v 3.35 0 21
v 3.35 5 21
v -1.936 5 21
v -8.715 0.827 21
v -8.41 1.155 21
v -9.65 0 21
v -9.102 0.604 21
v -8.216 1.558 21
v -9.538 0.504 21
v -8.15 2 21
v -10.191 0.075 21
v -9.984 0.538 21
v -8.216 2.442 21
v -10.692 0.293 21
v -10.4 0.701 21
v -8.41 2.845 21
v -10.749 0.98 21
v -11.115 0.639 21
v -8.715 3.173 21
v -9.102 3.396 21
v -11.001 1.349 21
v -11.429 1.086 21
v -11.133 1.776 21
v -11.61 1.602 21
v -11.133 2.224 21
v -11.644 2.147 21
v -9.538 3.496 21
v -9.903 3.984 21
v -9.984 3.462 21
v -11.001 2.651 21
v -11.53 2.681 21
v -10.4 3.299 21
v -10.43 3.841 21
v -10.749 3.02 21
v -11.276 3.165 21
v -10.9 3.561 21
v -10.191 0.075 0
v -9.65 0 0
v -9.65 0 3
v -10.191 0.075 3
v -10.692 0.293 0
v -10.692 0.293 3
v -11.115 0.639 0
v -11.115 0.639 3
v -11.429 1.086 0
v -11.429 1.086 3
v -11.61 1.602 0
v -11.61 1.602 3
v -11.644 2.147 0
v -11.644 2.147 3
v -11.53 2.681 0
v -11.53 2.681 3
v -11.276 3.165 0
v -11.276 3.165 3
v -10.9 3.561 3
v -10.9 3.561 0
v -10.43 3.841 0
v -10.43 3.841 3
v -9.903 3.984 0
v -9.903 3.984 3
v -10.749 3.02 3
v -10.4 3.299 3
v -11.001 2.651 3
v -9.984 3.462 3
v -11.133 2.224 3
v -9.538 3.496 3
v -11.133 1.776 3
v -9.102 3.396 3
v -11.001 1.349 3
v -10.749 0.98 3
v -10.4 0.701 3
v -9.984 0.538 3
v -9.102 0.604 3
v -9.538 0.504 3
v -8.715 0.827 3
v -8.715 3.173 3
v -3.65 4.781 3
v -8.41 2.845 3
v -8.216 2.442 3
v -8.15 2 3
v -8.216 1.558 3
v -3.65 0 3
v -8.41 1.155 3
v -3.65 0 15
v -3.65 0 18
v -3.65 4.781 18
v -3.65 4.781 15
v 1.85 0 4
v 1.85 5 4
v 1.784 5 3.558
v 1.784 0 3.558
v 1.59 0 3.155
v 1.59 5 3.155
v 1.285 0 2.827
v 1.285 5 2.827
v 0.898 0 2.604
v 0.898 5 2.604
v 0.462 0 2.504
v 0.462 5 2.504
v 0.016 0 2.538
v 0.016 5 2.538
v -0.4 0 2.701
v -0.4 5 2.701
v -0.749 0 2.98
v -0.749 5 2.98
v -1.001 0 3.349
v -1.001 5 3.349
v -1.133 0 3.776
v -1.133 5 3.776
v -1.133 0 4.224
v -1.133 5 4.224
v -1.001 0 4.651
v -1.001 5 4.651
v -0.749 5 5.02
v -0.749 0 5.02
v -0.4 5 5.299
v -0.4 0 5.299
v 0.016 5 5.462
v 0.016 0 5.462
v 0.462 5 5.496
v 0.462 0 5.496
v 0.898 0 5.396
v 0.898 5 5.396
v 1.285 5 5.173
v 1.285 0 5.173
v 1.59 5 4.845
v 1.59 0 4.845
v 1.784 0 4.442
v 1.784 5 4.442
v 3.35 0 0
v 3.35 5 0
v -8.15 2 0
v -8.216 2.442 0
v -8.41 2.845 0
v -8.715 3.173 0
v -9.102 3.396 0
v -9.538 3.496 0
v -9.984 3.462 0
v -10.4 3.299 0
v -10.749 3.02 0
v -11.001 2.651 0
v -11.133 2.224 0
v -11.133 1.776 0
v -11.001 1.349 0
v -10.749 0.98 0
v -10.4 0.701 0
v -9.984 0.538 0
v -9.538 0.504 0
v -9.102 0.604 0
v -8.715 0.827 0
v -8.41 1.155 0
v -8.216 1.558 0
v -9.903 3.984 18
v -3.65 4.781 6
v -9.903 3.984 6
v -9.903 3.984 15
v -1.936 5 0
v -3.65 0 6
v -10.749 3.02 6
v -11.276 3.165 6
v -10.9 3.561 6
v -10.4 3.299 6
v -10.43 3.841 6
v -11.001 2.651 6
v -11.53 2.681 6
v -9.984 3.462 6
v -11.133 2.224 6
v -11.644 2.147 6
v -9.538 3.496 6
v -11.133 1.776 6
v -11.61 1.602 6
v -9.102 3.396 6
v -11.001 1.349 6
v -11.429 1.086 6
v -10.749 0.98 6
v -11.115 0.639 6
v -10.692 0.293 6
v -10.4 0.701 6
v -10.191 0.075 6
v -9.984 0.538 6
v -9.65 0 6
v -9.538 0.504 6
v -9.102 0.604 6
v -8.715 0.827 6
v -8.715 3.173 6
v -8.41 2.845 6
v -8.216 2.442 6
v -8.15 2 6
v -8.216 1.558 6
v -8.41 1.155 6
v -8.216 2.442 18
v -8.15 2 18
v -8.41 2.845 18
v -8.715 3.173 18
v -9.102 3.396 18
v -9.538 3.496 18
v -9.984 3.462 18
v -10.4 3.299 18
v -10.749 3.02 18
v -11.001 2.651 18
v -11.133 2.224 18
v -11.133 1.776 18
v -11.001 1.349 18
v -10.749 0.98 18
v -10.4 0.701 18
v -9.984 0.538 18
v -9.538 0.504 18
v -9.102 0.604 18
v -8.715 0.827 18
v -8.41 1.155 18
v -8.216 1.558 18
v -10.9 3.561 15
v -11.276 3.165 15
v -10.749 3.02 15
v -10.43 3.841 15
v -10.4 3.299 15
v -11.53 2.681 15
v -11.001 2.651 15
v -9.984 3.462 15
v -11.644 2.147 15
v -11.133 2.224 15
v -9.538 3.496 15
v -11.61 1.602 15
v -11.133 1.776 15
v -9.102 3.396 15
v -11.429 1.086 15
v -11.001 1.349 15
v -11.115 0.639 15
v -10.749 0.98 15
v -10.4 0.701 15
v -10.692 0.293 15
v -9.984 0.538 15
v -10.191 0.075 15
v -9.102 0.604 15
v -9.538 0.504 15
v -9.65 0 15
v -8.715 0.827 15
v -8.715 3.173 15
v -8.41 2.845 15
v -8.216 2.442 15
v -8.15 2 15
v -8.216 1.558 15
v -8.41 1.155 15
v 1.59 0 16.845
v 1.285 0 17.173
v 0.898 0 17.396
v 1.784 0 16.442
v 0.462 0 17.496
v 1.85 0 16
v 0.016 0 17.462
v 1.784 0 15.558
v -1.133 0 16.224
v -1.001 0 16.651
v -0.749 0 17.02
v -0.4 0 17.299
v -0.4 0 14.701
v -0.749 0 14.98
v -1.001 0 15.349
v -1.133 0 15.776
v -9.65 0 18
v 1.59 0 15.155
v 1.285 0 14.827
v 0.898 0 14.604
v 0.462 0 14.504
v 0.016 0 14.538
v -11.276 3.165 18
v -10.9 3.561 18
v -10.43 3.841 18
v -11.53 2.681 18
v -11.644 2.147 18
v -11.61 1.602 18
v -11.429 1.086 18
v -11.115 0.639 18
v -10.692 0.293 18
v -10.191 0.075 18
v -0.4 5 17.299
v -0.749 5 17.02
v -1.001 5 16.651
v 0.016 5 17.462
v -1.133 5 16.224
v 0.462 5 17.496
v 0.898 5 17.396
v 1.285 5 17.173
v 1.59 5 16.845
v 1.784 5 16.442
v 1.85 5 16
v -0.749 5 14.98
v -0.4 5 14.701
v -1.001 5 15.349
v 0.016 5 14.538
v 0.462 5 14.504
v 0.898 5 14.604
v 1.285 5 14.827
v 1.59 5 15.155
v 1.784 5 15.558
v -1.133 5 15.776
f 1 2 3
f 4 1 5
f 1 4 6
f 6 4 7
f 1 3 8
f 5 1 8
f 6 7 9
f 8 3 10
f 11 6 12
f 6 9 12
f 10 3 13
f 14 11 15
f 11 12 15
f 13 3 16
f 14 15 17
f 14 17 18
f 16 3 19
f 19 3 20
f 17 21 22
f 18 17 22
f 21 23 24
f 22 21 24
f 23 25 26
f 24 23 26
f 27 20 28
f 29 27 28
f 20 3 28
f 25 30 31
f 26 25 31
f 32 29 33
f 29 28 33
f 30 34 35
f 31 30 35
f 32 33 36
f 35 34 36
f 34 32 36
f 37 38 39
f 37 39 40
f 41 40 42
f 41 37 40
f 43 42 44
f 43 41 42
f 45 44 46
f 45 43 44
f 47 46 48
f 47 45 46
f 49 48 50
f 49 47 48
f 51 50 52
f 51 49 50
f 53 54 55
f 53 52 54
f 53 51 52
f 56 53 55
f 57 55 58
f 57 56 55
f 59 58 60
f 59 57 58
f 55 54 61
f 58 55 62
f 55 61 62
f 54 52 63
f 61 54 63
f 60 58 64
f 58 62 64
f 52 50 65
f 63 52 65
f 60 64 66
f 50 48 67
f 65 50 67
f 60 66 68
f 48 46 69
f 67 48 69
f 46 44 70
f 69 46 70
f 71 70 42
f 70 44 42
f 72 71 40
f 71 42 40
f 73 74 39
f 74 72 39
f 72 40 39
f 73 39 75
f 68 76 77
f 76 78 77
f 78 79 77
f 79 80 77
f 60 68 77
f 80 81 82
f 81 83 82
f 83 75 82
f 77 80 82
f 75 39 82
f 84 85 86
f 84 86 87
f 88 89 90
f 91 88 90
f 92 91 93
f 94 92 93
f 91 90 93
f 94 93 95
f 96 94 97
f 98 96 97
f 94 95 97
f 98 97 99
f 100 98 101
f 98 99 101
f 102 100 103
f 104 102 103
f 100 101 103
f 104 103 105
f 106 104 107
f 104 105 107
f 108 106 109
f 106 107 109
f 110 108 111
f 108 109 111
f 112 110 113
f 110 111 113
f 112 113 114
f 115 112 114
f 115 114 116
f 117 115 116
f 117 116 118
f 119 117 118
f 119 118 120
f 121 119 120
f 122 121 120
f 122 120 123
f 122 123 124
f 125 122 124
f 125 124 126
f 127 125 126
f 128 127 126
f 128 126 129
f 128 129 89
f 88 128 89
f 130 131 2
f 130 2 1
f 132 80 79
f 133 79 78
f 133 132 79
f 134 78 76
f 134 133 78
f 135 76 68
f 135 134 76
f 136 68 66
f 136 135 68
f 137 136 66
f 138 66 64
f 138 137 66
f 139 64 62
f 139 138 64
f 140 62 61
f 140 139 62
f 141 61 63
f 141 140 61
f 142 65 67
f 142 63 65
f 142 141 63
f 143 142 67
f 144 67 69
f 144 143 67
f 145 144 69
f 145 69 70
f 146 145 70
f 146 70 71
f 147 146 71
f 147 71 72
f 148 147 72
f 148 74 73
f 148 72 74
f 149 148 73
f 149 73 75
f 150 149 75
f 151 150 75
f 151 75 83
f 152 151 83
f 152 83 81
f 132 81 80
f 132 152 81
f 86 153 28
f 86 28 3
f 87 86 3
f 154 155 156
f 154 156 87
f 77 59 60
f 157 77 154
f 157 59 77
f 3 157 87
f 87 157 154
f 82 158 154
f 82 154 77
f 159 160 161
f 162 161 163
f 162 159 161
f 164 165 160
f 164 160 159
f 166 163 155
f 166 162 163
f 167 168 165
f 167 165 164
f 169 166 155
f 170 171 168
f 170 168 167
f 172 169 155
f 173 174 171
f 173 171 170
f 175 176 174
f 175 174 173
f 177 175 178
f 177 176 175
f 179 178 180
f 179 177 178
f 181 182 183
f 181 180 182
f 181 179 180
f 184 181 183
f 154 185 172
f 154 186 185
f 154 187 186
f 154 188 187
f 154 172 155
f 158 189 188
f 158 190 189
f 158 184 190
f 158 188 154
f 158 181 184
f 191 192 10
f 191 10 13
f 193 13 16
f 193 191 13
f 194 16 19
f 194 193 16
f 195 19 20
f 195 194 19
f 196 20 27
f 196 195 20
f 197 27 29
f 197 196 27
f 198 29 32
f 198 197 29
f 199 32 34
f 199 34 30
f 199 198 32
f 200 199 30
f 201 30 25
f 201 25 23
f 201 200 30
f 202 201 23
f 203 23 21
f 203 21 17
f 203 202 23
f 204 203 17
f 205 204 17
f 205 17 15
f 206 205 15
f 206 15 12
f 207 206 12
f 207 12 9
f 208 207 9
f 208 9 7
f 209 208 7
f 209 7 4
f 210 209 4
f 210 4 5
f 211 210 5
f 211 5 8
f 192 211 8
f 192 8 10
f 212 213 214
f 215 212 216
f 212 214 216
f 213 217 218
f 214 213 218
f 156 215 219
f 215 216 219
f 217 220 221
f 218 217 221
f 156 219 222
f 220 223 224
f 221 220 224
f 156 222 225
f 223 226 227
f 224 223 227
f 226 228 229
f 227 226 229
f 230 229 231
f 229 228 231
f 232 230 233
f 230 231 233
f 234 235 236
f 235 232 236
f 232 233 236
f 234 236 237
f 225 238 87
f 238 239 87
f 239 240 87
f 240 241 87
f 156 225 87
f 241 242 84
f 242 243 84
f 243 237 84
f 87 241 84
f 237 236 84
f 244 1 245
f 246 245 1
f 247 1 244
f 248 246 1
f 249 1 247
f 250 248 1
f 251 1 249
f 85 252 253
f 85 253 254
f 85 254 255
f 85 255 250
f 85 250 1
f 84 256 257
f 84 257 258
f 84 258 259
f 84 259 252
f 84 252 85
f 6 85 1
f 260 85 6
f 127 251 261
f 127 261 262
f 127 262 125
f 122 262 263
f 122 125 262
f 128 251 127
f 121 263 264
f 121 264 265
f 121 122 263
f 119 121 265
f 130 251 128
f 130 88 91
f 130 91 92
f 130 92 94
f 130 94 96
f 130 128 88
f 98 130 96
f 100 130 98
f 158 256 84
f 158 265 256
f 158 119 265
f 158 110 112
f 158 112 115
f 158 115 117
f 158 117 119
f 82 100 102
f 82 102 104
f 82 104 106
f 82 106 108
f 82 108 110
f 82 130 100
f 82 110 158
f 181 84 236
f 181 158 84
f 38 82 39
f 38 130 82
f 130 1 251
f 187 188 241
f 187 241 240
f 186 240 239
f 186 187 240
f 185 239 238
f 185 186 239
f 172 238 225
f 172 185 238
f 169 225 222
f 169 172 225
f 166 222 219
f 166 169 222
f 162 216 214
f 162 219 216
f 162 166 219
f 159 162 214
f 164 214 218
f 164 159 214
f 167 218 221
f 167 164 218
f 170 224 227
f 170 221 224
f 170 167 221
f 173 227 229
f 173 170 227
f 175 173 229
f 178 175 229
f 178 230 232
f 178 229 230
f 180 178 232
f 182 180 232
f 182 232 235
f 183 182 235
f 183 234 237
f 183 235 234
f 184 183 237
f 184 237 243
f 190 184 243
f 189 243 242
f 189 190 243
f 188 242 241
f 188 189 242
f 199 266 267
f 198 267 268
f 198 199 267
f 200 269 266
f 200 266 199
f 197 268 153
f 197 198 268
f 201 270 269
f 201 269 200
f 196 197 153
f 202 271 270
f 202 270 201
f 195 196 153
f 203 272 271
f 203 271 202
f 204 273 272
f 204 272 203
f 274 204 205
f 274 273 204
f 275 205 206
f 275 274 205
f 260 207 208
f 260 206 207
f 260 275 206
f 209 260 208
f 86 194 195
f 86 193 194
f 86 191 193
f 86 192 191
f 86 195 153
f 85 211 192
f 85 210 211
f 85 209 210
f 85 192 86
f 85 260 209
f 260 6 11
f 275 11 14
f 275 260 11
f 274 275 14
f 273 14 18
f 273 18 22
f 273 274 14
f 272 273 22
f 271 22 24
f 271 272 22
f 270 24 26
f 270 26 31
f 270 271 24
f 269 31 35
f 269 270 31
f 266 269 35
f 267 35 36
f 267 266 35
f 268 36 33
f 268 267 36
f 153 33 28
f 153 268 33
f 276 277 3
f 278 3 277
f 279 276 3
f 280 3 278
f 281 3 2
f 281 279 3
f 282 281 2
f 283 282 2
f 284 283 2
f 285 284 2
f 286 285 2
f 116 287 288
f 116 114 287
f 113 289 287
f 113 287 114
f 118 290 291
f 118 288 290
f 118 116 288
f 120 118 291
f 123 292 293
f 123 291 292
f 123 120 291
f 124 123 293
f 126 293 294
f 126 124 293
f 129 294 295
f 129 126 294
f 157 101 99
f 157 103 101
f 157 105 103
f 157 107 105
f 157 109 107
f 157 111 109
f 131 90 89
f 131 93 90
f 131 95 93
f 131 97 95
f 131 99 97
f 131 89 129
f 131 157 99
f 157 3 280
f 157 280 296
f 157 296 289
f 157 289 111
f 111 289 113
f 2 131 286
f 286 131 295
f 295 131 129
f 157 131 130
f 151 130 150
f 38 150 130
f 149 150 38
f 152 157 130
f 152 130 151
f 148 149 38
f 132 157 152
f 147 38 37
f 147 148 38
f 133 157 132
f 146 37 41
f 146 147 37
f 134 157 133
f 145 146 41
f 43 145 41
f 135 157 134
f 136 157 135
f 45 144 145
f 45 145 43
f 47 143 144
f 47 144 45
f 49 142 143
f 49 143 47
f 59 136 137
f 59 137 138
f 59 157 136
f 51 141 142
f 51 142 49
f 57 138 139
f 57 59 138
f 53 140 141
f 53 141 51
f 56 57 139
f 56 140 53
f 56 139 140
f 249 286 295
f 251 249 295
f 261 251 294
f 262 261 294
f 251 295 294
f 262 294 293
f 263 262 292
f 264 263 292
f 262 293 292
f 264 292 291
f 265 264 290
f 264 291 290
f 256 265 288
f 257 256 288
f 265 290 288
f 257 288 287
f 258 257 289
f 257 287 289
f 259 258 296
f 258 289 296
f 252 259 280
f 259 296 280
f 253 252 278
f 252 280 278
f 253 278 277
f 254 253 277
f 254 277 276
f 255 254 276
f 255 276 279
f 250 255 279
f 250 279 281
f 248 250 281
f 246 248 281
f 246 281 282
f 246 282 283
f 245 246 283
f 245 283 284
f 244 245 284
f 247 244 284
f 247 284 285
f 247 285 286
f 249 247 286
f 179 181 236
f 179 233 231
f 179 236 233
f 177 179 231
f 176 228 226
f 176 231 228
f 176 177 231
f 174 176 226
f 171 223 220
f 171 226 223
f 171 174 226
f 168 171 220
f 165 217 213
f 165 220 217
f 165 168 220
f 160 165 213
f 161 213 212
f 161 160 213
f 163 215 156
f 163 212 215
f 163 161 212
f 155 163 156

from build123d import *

# Parameters (mm, degrees)
SKETCH_1_R          = 1.5
EXTRUDE_1_DEPTH     = 21
SKETCH_3_W          = 8
SKETCH_3_H          = 3
CUT_EXTRUDE_1_DEPTH = 6
SKETCH_4_R          = 1.5
CUT_EXTRUDE_2_DEPTH = 21


with BuildPart() as part:
    # 草图1 → 凸台-拉伸1 (new body)
    with BuildSketch(Plane.XY):
        with BuildLine():
            Line((-1.936190112, 5), (3.350194549, 5))
            Line((3.350194549, 5), (3.350194549, 0))
            Line((3.350194549, 0), (0, 0))
            Line((0, 0), (-9.649805451, 0))
            ThreePointArc((-9.649805451, 0), (-11.645783707, 1.873229335), (-9.902836943, 3.983929198))
            Line((-9.902836943, 3.983929198), (-1.936190112, 5))
        make_face()
        with Locations((-9.649805451, 2)):
            Circle(SKETCH_1_R, mode=Mode.SUBTRACT)
    extrude(amount=EXTRUDE_1_DEPTH)

    # 草图3 → 切除-拉伸1 (cut, through all)
    with BuildSketch(Plane(origin=(0, 0, 0), x_dir=(1, 0, 0), z_dir=(0, 1, 0))):
        with Locations((-7.649805451, -4.5)):
            Rectangle(SKETCH_3_W, SKETCH_3_H)
        with Locations((-7.649805451, -16.5)):
            Rectangle(SKETCH_3_W, SKETCH_3_H)
    extrude(amount=CUT_EXTRUDE_1_DEPTH, mode=Mode.SUBTRACT)

    # 草图4 → 切除-拉伸2 (cut)
    with BuildSketch(Plane(origin=(0, 5, 0), x_dir=(1, 0, 0), z_dir=(0, 1, 0))):
        with Locations((0.350194549, -4)):
            Circle(SKETCH_4_R)
        with Locations((0.350194549, -16)):
            Circle(SKETCH_4_R)
    extrude(amount=-CUT_EXTRUDE_2_DEPTH, mode=Mode.SUBTRACT)


solid = part.part
